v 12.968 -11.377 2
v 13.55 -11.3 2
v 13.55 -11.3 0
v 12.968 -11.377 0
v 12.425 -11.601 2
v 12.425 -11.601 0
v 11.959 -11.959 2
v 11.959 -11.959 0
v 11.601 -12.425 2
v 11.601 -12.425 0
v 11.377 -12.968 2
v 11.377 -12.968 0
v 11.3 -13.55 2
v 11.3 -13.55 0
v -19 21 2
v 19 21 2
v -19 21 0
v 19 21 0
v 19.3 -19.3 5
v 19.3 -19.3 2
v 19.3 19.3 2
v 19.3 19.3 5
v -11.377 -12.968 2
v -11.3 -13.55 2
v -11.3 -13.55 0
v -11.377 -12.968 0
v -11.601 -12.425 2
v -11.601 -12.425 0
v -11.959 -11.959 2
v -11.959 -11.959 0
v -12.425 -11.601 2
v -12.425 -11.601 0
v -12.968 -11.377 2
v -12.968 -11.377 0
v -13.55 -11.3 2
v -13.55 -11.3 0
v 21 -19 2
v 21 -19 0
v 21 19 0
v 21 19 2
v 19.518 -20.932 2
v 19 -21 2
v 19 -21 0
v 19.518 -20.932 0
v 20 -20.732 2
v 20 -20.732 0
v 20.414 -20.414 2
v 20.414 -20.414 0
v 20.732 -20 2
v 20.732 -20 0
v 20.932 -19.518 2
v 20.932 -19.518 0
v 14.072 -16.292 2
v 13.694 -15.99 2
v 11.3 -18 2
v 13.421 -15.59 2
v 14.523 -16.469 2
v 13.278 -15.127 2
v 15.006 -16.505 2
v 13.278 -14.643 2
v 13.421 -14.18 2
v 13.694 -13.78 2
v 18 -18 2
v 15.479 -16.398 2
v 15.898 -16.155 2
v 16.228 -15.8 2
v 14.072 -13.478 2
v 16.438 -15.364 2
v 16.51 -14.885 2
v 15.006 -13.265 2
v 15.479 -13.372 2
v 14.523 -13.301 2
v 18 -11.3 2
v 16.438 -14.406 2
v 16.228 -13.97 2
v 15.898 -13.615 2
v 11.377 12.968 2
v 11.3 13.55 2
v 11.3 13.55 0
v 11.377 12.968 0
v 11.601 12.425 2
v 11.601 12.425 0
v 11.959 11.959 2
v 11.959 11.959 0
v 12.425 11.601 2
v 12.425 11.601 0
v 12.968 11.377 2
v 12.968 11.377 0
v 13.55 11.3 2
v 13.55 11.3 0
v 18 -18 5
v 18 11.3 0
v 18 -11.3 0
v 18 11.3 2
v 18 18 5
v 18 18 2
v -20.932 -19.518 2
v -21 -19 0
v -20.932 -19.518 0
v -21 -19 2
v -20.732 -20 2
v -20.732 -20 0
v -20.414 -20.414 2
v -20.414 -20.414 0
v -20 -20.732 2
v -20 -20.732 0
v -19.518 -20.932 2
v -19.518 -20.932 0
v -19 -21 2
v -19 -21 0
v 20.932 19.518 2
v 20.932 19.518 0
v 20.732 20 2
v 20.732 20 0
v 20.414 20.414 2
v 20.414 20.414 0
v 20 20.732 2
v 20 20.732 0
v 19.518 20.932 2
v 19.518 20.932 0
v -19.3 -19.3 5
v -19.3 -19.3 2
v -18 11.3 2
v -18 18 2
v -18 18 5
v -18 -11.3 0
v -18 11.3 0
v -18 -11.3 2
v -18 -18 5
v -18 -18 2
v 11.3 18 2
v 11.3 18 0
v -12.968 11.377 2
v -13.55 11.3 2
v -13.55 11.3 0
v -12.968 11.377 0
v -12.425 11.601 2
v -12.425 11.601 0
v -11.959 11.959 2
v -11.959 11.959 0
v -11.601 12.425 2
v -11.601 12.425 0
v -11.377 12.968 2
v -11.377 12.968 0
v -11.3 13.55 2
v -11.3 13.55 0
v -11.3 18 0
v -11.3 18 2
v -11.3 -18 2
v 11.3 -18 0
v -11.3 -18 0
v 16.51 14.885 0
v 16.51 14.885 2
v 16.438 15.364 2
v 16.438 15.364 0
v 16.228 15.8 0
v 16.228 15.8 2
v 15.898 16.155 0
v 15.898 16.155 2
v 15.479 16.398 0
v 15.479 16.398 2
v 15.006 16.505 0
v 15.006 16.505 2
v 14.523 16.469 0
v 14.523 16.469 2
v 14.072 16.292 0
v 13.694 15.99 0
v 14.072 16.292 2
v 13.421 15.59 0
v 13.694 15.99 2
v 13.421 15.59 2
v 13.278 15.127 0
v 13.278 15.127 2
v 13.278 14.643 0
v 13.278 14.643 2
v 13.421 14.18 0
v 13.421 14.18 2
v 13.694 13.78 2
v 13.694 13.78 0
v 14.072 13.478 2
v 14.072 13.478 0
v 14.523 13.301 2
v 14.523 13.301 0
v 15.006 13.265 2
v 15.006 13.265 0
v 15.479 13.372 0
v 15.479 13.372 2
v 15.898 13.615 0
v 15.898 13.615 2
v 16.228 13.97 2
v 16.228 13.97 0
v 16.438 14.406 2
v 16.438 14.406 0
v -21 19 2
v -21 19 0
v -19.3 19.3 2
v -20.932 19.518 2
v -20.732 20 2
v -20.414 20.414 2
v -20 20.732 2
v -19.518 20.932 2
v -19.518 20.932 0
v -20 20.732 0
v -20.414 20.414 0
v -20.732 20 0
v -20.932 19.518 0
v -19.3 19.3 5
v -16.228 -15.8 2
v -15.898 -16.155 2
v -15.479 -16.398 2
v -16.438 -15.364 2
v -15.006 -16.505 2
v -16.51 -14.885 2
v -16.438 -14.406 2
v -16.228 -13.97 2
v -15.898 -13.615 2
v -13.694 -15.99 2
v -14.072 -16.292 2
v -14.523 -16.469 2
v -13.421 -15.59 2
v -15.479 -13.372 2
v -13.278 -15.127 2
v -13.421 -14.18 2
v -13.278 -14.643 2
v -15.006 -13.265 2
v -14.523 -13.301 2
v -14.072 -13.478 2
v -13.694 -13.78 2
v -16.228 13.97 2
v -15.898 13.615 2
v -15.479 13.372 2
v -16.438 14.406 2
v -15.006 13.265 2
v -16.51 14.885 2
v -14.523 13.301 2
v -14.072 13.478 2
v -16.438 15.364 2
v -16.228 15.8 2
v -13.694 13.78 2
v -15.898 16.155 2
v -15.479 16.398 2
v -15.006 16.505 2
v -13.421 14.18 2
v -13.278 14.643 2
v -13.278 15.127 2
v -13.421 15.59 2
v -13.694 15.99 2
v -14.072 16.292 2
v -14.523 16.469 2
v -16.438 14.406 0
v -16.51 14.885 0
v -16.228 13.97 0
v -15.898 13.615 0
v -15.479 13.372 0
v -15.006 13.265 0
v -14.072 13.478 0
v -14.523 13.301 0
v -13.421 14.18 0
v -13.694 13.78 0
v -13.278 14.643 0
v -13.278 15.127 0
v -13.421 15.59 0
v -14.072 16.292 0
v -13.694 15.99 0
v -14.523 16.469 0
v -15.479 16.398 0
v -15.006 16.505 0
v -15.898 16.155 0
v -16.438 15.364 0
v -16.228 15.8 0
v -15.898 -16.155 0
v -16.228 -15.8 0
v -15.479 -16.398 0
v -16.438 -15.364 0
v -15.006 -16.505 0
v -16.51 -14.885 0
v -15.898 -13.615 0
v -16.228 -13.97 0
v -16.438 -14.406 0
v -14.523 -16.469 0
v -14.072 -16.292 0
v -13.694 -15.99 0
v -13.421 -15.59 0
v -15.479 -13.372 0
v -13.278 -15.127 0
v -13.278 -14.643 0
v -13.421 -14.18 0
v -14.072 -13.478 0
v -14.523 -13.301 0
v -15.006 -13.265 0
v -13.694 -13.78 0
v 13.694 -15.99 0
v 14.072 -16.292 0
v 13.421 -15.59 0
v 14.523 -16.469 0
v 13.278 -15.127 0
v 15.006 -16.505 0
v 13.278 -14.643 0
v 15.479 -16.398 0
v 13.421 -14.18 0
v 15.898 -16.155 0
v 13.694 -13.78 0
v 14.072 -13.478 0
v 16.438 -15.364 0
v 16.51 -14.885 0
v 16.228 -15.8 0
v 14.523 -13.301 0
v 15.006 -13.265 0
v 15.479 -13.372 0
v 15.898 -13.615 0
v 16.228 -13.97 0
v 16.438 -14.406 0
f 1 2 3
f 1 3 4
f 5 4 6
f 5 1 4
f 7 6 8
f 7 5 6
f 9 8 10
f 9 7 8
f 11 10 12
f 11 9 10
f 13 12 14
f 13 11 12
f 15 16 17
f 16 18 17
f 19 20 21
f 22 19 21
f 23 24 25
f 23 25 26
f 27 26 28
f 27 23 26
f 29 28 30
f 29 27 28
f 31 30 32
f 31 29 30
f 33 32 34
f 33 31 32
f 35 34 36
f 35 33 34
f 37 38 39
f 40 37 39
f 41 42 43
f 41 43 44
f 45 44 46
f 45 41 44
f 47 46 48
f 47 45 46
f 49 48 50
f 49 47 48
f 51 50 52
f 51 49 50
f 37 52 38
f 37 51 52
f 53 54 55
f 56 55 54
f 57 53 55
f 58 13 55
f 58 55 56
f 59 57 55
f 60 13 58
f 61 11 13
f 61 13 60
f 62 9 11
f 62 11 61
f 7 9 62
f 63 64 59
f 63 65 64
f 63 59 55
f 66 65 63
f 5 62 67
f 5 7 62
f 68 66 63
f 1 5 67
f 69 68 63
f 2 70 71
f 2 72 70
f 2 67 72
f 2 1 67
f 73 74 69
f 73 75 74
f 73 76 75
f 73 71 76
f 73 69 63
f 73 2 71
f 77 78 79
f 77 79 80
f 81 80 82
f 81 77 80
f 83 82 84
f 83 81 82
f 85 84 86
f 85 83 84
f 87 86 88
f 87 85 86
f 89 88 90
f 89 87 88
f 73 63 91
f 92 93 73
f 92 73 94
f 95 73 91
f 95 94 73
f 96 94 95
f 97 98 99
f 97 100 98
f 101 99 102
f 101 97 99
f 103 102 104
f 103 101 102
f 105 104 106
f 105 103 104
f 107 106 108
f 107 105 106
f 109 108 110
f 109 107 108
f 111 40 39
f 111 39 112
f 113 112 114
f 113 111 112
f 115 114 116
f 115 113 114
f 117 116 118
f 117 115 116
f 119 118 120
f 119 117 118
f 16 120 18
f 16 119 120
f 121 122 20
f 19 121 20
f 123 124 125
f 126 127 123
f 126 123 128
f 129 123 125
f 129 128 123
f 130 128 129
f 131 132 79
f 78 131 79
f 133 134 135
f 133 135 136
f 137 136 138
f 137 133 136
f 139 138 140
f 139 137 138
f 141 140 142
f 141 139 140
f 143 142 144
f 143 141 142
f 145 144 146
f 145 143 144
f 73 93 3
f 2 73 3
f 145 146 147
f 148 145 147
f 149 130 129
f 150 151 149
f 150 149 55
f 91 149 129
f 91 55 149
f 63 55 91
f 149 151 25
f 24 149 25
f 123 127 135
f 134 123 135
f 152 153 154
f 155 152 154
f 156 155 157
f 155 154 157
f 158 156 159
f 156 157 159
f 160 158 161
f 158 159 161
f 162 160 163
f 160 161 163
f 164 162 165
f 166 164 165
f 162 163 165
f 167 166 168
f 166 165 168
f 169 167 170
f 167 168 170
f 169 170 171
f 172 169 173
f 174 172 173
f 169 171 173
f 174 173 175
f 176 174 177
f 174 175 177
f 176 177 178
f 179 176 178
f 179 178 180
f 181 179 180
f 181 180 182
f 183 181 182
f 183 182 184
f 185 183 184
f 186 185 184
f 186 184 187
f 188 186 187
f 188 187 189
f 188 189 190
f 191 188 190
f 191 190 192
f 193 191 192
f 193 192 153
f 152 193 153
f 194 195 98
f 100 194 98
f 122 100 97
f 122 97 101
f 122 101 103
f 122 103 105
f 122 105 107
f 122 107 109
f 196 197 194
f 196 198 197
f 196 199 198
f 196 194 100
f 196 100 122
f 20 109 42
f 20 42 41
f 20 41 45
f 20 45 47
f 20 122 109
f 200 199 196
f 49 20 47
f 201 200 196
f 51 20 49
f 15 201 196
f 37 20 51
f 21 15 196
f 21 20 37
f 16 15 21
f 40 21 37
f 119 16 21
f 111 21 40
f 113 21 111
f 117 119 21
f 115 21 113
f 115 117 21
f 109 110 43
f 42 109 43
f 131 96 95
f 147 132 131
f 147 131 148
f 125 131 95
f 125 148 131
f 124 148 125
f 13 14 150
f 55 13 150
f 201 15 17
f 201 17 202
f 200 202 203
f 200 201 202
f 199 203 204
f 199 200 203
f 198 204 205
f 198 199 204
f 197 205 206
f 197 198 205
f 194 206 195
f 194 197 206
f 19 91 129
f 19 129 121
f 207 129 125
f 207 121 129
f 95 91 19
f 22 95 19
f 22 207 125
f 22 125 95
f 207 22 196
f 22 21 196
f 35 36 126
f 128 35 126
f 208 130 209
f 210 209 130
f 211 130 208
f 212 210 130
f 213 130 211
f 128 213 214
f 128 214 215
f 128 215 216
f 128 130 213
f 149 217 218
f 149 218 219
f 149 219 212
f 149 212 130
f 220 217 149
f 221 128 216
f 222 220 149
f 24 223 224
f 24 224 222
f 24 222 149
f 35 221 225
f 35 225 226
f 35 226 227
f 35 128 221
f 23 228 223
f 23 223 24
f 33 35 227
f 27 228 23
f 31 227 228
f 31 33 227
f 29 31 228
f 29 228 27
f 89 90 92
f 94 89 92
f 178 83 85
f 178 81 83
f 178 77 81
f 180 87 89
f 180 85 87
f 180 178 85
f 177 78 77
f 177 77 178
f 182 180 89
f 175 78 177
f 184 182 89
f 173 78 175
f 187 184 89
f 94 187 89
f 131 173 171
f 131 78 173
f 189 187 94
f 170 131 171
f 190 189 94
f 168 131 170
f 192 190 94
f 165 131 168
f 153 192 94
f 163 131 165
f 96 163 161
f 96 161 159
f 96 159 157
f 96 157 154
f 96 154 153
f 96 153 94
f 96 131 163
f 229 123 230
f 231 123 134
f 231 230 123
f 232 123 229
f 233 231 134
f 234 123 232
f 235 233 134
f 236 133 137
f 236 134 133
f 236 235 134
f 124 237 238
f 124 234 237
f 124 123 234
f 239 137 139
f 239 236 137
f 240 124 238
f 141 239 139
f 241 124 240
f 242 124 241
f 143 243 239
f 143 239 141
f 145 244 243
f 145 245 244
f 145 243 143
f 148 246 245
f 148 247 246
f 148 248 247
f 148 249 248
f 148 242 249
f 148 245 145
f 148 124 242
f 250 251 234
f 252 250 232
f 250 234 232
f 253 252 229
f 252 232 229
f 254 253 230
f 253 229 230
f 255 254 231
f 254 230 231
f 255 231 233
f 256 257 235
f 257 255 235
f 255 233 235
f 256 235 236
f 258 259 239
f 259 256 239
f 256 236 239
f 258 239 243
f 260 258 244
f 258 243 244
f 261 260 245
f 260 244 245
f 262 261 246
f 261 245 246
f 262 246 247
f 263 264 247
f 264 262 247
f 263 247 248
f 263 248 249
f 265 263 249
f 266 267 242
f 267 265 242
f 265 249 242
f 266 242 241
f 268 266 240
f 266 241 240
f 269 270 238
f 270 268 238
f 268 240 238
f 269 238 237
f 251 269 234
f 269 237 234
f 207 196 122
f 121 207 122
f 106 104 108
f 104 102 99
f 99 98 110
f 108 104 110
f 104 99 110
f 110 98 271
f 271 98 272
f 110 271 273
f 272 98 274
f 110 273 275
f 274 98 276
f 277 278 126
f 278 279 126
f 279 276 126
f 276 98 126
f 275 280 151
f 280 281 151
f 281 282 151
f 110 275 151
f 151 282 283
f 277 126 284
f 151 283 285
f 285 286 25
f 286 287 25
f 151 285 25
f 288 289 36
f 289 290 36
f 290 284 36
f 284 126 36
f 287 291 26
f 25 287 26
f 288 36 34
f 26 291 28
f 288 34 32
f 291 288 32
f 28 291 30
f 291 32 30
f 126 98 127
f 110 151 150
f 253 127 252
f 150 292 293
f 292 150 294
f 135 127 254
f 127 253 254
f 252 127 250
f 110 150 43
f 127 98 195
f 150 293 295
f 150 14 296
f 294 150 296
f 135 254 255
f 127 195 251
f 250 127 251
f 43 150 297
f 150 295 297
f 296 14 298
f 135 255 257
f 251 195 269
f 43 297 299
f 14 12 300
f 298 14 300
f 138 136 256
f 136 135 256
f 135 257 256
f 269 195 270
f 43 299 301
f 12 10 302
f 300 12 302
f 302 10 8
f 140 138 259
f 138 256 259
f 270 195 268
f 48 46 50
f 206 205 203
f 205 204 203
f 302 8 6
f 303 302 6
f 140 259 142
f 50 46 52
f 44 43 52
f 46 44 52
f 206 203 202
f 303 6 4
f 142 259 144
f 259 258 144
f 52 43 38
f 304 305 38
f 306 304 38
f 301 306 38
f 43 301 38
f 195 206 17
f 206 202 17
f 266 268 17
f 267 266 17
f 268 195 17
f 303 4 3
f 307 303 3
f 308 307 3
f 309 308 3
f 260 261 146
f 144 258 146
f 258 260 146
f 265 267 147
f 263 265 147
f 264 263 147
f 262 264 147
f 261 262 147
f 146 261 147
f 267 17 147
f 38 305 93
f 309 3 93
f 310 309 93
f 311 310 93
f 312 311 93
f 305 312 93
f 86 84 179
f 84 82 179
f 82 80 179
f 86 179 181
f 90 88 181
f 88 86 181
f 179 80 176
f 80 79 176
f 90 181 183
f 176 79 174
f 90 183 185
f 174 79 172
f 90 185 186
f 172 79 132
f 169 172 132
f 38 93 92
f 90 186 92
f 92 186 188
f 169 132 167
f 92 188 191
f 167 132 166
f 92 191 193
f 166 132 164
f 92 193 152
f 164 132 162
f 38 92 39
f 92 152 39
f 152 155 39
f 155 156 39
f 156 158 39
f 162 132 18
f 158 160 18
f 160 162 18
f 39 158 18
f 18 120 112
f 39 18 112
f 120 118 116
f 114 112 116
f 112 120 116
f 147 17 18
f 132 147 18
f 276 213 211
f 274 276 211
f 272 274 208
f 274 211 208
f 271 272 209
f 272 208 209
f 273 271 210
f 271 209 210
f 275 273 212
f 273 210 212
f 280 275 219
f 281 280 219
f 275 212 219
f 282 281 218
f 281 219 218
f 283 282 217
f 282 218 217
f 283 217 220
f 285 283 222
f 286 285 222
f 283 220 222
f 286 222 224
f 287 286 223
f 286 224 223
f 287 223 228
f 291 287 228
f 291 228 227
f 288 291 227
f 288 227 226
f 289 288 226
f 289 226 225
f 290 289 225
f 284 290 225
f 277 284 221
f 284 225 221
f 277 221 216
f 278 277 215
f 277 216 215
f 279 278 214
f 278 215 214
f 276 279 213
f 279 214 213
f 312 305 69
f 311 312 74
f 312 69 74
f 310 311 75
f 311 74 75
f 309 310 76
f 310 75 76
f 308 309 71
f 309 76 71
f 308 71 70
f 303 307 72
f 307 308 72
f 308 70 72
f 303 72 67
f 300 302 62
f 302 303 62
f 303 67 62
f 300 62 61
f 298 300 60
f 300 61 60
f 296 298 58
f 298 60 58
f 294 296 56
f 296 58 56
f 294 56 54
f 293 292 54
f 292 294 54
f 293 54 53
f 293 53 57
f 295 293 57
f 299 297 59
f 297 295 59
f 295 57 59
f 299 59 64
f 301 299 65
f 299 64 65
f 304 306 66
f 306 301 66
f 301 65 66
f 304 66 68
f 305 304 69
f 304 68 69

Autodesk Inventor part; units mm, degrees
ref_plane "YZ Plane" through (0, 0, 0) normal (1, 0, 0) x (0, 1, 0)
ref_plane "XZ Plane" through (0, 0, 0) normal (0, 1, 0) x (-1, 0, 0)
ref_plane "XY Plane" through (0, 0, 0) normal (0, 0, 1) x (1, 0, 0)
sketch "Sketch1" plane through (0, 0, 0) normal (0, 0, 1) x (1, 0, 0)
  line L0 (-21, -21) -> (21, -21)
  line L1 (21, -21) -> (21, 21)
  line L2 (21, 21) -> (-21, 21)
  line L3 (-21, 21) -> (-21, -21)
  line L4 (-21, -21) -> (21, 21) construction
  line L5 (21, -21) -> (-21, 21) construction
  line L6 (-18, -18) -> (18, -18)
  line L7 (18, -18) -> (18, 18)
  line L8 (18, 18) -> (-18, 18)
  line L9 (-18, 18) -> (-18, -18)
  line L10 (-18, -18) -> (18, 18) construction
  line L11 (18, -18) -> (-18, 18) construction
  line L12 (18, 18) -> (13.26, 18)
  line L13 (13.26, 18) -> (13.26, 13.26)
  line L14 (13.26, 13.26) -> (18, 13.26)
  line L15 (18, 13.26) -> (18, 18)
  line L16 (18, 18) -> (14.885, 18)
  line L17 (14.885, 18) -> (14.885, 14.885)
  line L18 (14.885, 14.885) -> (18, 14.885)
  line L19 (18, 14.885) -> (18, 18)
  circle A0 centre (14.885, 14.885) radius 1.625
  line L20 (18, 18) -> (11.3, 18)
  line L21 (11.3, 18) -> (11.3, 11.3)
  line L22 (11.3, 11.3) -> (18, 11.3)
  line L23 (18, 11.3) -> (18, 18)
  circle A1 centre (13.26, 13.26) radius 1.96
  point P0 (0, 0)
  dimension "d0" = 42
  dimension "d1" = 42
  dimension "d2" = 36
  dimension "d3" = 36
  dimension "d4" = 4.74
  dimension "d5" = 4.74
  dimension "d6" = 3.115
  dimension "d7" = 6.7
  dimension "d8" = 6.7
extrude "Extrusion1" add sketch "Sketch1" along normal blind 2 contours L3 L2 L1 L0 | L22 A1 L14 L7 | L8 L13 A1 L21 | L14 A1 A0 L18 L7 | L22 L21 A1 | A1 L13 L14 | L8 L17 A0 A1 L13 | L18 A0 L17 L8 L7 | L14 A0 A1 | A1 A0 L13 | A0 A1 L17 L18 | L18 L17 A0 | L14 L13 A0 | A0 A1
mirror "Mirror1" about plane through (0, 0, 0) normal (1, 0, 0) of "Extrusion1"
mirror "Mirror2" about plane through (0, 0, 0) normal (0, 1, 0) of "Extrusion1", "Mirror1"
fillet "Fillet1" radius 2.25 4 edges at (-11.3, 11.3, 1) (11.3, 11.3, 1) (11.3, -11.3, 1) (-11.3, -11.3, 1)
sketch "Sketch2" plane through (0, 0, 2) normal (0, 0, 1) x (1, 0, 0)
  line L0 (21, -21) -> (21, 21) projected
  line L1 (21, 21) -> (14.885, 21)
  line L2 (14.885, 21) -> (14.885, 14.885)
  line L3 (14.885, 14.885) -> (21, 14.885)
  line L4 (21, 14.885) -> (21, 21)
  circle A0 centre (14.885, 14.885) radius 1.625
  point P0 (0, 0)
  dimension "d12" = 6.115
  dimension "d13" = 6.115
  dimension "d14" = 3.25
extrude "Extrusion2" cut sketch "Sketch2" against normal blind 2 contours A0 L2 L3 | L3 L2 A0
mirror "Mirror3" about plane through (0, 0, 0) normal (0, 1, 0) of "Extrusion2"
mirror "Mirror4" about plane through (0, 0, 0) normal (1, 0, 0) of "Extrusion2", "Mirror3"
sketch "Sketch5" plane through (0, 0, 2) normal (0, 0, 1) x (1, 0, 0)
  line L0 (-18, -18) -> (18, -18)
  line L1 (18, -18) -> (18, 18)
  line L2 (18, 18) -> (-18, 18)
  line L3 (-18, 18) -> (-18, -18)
  line L4 (-18, -18) -> (18, 18) construction
  line L5 (18, -18) -> (-18, 18) construction
  line L6 (-19.3, -19.3) -> (19.3, -19.3)
  line L7 (19.3, -19.3) -> (19.3, 19.3)
  line L8 (19.3, 19.3) -> (-19.3, 19.3)
  line L9 (-19.3, 19.3) -> (-19.3, -19.3)
  line L10 (-19.3, -19.3) -> (19.3, 19.3) construction
  line L11 (19.3, -19.3) -> (-19.3, 19.3) construction
  point P0 (0, 0)
  dimension "d26" = 36
  dimension "d27" = 36
  dimension "d28" = 38.6
  dimension "d29" = 38.6
extrude "Extrusion5" add sketch "Sketch5" along normal blind 3
fillet "Fillet2" radius 2 4 edges at (21, -21, 1) (21, 21, 1) (-21, 21, 1) (-21, -21, 1)
properties part number "camerashield2"
